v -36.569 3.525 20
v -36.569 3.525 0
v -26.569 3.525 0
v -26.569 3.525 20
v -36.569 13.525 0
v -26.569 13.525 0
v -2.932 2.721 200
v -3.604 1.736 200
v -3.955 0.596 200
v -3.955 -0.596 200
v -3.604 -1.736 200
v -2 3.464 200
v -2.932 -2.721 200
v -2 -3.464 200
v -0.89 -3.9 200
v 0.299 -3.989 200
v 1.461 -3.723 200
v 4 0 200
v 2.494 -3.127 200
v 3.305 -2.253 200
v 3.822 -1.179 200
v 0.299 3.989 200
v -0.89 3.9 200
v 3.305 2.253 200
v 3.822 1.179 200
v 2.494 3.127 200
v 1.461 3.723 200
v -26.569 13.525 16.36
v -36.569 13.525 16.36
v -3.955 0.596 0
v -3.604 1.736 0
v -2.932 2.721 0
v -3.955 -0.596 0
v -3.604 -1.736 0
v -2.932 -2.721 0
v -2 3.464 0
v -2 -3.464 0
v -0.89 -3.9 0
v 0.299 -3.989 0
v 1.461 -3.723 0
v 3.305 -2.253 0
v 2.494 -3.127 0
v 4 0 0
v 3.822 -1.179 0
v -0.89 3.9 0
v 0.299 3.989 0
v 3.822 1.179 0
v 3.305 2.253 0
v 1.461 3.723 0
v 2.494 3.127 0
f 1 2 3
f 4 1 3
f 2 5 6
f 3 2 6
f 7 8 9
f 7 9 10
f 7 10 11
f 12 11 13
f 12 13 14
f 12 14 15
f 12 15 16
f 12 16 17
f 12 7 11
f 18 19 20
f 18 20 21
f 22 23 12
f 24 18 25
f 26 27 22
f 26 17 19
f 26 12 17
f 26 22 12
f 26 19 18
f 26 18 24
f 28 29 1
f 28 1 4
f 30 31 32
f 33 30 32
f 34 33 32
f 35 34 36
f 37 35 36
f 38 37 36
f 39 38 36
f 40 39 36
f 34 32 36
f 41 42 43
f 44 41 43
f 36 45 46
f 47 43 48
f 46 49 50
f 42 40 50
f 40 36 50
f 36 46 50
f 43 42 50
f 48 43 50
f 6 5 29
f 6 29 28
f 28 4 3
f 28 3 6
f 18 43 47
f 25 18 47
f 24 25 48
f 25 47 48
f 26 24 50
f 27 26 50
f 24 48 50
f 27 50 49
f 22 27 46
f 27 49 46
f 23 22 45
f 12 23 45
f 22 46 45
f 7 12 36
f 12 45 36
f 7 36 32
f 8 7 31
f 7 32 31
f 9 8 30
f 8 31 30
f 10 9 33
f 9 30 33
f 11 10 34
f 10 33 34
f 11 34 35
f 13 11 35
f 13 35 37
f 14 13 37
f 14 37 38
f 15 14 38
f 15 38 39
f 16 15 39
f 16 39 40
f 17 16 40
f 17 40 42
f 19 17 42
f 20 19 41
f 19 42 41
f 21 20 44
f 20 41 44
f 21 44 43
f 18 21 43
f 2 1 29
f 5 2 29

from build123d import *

# Parameters (mm, degrees)
F0_R     = 4
F1_DEPTH = 200
F2_W     = 10
F2_H     = 10
F3_DEPTH = 20
F4_SIZE2 = 3.639692
F4_SIZE  = 9.99999


# Not quite as in the source:
# - a fillet or chamfer is up to 0.001 mm smaller than in the source, because OpenCascade refuses the exact size


with BuildPart() as f1:
    # F0 (on Top) → F1 (new body)
    with BuildSketch(Plane.XY):
        Circle(F0_R)
    extrude(amount=F1_DEPTH)


with BuildPart() as f3:
    # F2 (on Top) → F3 (new body)
    with BuildSketch(Plane.XY):
        with Locations((-31.5685559809, 8.5248657316)):
            Rectangle(F2_W, F2_H)
    extrude(amount=F3_DEPTH)

    # F4 (size 10 and 3.6397023427 in the source; OpenCascade refuses exactly that, so slightly less here)
    f4_edges = [f3.edges().sort_by_distance(p)[0] for p in [
        (-31.568556, 13.524866, 20),
    ]]
    f4_side = f3.faces().sort_by_distance((-31.568556, 8.524866, 20))[0]
    chamfer(f4_edges, length=F4_SIZE, length2=F4_SIZE2, reference=f4_side)


solid = Compound([f1.part, f3.part])
